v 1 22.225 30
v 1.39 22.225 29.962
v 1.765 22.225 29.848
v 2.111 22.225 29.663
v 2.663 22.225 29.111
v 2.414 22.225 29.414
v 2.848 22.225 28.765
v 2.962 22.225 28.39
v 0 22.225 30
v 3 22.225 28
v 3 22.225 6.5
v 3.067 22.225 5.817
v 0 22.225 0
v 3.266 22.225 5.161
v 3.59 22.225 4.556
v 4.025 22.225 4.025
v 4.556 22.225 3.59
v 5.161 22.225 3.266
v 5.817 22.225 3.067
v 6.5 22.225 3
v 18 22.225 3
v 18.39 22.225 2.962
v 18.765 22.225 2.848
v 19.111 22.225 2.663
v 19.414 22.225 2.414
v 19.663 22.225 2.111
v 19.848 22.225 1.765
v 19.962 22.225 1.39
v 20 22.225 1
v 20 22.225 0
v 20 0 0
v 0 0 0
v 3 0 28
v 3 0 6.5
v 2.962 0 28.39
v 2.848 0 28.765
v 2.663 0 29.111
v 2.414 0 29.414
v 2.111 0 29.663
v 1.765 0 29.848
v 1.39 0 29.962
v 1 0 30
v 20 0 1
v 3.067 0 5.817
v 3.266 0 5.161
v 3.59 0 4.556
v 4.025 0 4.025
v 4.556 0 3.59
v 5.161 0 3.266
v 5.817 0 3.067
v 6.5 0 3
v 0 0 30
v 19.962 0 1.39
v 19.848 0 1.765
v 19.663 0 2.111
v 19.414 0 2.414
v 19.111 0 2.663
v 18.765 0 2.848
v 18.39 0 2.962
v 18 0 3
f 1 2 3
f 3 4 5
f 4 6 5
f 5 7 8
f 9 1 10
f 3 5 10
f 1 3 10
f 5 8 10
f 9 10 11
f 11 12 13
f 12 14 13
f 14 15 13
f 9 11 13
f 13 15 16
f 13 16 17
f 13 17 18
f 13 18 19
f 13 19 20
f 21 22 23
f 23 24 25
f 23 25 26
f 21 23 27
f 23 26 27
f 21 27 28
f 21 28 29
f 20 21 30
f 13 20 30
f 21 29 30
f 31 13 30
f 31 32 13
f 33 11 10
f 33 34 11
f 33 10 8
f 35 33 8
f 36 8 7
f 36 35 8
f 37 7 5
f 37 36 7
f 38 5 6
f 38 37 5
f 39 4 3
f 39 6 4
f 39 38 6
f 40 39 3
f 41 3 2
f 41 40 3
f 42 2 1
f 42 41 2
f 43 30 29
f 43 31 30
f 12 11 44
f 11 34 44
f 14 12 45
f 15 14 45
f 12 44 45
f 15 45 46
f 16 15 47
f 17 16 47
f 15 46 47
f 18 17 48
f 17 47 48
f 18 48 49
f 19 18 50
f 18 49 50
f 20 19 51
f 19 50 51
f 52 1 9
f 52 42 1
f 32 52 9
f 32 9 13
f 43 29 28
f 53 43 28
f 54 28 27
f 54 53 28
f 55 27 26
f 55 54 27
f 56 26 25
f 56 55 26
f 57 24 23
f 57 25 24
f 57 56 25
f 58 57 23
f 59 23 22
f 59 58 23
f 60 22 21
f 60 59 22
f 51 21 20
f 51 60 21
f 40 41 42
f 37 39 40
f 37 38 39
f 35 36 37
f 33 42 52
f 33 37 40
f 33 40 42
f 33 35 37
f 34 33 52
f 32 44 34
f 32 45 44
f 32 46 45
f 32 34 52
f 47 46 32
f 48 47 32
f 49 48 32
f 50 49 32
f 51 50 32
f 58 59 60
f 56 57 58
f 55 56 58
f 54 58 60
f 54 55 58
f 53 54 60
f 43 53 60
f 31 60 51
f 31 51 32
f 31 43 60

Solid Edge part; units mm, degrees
sketch "Sketch1" plane through (0, 0, 0) normal (0, -1, 0) x (1, 0, 0)
  line L0 (20, 0) -> (20, 1)
  arc A0 (18, 3) -> (20, 1) centre (18, 1) cw
  line L1 (18, 3) -> (6.5, 3)
  arc A1 (3, 6.5) -> (6.5, 3) centre (6.5, 6.5) ccw
  line L2 (3, 6.5) -> (3, 28)
  arc A2 (1, 30) -> (3, 28) centre (1, 28) cw
  line L3 (1, 30) -> (0, 30)
  line L4 (0, 30) -> (0, 0)
  line L5 (0, 0) -> (20, 0)
  dimension "D1" = 30
  dimension "D2" = 20
  dimension "D3" = 3
  dimension "D4" = 3
extrude "Protrusion1" add sketch "Sketch1" against normal blind 22.225
